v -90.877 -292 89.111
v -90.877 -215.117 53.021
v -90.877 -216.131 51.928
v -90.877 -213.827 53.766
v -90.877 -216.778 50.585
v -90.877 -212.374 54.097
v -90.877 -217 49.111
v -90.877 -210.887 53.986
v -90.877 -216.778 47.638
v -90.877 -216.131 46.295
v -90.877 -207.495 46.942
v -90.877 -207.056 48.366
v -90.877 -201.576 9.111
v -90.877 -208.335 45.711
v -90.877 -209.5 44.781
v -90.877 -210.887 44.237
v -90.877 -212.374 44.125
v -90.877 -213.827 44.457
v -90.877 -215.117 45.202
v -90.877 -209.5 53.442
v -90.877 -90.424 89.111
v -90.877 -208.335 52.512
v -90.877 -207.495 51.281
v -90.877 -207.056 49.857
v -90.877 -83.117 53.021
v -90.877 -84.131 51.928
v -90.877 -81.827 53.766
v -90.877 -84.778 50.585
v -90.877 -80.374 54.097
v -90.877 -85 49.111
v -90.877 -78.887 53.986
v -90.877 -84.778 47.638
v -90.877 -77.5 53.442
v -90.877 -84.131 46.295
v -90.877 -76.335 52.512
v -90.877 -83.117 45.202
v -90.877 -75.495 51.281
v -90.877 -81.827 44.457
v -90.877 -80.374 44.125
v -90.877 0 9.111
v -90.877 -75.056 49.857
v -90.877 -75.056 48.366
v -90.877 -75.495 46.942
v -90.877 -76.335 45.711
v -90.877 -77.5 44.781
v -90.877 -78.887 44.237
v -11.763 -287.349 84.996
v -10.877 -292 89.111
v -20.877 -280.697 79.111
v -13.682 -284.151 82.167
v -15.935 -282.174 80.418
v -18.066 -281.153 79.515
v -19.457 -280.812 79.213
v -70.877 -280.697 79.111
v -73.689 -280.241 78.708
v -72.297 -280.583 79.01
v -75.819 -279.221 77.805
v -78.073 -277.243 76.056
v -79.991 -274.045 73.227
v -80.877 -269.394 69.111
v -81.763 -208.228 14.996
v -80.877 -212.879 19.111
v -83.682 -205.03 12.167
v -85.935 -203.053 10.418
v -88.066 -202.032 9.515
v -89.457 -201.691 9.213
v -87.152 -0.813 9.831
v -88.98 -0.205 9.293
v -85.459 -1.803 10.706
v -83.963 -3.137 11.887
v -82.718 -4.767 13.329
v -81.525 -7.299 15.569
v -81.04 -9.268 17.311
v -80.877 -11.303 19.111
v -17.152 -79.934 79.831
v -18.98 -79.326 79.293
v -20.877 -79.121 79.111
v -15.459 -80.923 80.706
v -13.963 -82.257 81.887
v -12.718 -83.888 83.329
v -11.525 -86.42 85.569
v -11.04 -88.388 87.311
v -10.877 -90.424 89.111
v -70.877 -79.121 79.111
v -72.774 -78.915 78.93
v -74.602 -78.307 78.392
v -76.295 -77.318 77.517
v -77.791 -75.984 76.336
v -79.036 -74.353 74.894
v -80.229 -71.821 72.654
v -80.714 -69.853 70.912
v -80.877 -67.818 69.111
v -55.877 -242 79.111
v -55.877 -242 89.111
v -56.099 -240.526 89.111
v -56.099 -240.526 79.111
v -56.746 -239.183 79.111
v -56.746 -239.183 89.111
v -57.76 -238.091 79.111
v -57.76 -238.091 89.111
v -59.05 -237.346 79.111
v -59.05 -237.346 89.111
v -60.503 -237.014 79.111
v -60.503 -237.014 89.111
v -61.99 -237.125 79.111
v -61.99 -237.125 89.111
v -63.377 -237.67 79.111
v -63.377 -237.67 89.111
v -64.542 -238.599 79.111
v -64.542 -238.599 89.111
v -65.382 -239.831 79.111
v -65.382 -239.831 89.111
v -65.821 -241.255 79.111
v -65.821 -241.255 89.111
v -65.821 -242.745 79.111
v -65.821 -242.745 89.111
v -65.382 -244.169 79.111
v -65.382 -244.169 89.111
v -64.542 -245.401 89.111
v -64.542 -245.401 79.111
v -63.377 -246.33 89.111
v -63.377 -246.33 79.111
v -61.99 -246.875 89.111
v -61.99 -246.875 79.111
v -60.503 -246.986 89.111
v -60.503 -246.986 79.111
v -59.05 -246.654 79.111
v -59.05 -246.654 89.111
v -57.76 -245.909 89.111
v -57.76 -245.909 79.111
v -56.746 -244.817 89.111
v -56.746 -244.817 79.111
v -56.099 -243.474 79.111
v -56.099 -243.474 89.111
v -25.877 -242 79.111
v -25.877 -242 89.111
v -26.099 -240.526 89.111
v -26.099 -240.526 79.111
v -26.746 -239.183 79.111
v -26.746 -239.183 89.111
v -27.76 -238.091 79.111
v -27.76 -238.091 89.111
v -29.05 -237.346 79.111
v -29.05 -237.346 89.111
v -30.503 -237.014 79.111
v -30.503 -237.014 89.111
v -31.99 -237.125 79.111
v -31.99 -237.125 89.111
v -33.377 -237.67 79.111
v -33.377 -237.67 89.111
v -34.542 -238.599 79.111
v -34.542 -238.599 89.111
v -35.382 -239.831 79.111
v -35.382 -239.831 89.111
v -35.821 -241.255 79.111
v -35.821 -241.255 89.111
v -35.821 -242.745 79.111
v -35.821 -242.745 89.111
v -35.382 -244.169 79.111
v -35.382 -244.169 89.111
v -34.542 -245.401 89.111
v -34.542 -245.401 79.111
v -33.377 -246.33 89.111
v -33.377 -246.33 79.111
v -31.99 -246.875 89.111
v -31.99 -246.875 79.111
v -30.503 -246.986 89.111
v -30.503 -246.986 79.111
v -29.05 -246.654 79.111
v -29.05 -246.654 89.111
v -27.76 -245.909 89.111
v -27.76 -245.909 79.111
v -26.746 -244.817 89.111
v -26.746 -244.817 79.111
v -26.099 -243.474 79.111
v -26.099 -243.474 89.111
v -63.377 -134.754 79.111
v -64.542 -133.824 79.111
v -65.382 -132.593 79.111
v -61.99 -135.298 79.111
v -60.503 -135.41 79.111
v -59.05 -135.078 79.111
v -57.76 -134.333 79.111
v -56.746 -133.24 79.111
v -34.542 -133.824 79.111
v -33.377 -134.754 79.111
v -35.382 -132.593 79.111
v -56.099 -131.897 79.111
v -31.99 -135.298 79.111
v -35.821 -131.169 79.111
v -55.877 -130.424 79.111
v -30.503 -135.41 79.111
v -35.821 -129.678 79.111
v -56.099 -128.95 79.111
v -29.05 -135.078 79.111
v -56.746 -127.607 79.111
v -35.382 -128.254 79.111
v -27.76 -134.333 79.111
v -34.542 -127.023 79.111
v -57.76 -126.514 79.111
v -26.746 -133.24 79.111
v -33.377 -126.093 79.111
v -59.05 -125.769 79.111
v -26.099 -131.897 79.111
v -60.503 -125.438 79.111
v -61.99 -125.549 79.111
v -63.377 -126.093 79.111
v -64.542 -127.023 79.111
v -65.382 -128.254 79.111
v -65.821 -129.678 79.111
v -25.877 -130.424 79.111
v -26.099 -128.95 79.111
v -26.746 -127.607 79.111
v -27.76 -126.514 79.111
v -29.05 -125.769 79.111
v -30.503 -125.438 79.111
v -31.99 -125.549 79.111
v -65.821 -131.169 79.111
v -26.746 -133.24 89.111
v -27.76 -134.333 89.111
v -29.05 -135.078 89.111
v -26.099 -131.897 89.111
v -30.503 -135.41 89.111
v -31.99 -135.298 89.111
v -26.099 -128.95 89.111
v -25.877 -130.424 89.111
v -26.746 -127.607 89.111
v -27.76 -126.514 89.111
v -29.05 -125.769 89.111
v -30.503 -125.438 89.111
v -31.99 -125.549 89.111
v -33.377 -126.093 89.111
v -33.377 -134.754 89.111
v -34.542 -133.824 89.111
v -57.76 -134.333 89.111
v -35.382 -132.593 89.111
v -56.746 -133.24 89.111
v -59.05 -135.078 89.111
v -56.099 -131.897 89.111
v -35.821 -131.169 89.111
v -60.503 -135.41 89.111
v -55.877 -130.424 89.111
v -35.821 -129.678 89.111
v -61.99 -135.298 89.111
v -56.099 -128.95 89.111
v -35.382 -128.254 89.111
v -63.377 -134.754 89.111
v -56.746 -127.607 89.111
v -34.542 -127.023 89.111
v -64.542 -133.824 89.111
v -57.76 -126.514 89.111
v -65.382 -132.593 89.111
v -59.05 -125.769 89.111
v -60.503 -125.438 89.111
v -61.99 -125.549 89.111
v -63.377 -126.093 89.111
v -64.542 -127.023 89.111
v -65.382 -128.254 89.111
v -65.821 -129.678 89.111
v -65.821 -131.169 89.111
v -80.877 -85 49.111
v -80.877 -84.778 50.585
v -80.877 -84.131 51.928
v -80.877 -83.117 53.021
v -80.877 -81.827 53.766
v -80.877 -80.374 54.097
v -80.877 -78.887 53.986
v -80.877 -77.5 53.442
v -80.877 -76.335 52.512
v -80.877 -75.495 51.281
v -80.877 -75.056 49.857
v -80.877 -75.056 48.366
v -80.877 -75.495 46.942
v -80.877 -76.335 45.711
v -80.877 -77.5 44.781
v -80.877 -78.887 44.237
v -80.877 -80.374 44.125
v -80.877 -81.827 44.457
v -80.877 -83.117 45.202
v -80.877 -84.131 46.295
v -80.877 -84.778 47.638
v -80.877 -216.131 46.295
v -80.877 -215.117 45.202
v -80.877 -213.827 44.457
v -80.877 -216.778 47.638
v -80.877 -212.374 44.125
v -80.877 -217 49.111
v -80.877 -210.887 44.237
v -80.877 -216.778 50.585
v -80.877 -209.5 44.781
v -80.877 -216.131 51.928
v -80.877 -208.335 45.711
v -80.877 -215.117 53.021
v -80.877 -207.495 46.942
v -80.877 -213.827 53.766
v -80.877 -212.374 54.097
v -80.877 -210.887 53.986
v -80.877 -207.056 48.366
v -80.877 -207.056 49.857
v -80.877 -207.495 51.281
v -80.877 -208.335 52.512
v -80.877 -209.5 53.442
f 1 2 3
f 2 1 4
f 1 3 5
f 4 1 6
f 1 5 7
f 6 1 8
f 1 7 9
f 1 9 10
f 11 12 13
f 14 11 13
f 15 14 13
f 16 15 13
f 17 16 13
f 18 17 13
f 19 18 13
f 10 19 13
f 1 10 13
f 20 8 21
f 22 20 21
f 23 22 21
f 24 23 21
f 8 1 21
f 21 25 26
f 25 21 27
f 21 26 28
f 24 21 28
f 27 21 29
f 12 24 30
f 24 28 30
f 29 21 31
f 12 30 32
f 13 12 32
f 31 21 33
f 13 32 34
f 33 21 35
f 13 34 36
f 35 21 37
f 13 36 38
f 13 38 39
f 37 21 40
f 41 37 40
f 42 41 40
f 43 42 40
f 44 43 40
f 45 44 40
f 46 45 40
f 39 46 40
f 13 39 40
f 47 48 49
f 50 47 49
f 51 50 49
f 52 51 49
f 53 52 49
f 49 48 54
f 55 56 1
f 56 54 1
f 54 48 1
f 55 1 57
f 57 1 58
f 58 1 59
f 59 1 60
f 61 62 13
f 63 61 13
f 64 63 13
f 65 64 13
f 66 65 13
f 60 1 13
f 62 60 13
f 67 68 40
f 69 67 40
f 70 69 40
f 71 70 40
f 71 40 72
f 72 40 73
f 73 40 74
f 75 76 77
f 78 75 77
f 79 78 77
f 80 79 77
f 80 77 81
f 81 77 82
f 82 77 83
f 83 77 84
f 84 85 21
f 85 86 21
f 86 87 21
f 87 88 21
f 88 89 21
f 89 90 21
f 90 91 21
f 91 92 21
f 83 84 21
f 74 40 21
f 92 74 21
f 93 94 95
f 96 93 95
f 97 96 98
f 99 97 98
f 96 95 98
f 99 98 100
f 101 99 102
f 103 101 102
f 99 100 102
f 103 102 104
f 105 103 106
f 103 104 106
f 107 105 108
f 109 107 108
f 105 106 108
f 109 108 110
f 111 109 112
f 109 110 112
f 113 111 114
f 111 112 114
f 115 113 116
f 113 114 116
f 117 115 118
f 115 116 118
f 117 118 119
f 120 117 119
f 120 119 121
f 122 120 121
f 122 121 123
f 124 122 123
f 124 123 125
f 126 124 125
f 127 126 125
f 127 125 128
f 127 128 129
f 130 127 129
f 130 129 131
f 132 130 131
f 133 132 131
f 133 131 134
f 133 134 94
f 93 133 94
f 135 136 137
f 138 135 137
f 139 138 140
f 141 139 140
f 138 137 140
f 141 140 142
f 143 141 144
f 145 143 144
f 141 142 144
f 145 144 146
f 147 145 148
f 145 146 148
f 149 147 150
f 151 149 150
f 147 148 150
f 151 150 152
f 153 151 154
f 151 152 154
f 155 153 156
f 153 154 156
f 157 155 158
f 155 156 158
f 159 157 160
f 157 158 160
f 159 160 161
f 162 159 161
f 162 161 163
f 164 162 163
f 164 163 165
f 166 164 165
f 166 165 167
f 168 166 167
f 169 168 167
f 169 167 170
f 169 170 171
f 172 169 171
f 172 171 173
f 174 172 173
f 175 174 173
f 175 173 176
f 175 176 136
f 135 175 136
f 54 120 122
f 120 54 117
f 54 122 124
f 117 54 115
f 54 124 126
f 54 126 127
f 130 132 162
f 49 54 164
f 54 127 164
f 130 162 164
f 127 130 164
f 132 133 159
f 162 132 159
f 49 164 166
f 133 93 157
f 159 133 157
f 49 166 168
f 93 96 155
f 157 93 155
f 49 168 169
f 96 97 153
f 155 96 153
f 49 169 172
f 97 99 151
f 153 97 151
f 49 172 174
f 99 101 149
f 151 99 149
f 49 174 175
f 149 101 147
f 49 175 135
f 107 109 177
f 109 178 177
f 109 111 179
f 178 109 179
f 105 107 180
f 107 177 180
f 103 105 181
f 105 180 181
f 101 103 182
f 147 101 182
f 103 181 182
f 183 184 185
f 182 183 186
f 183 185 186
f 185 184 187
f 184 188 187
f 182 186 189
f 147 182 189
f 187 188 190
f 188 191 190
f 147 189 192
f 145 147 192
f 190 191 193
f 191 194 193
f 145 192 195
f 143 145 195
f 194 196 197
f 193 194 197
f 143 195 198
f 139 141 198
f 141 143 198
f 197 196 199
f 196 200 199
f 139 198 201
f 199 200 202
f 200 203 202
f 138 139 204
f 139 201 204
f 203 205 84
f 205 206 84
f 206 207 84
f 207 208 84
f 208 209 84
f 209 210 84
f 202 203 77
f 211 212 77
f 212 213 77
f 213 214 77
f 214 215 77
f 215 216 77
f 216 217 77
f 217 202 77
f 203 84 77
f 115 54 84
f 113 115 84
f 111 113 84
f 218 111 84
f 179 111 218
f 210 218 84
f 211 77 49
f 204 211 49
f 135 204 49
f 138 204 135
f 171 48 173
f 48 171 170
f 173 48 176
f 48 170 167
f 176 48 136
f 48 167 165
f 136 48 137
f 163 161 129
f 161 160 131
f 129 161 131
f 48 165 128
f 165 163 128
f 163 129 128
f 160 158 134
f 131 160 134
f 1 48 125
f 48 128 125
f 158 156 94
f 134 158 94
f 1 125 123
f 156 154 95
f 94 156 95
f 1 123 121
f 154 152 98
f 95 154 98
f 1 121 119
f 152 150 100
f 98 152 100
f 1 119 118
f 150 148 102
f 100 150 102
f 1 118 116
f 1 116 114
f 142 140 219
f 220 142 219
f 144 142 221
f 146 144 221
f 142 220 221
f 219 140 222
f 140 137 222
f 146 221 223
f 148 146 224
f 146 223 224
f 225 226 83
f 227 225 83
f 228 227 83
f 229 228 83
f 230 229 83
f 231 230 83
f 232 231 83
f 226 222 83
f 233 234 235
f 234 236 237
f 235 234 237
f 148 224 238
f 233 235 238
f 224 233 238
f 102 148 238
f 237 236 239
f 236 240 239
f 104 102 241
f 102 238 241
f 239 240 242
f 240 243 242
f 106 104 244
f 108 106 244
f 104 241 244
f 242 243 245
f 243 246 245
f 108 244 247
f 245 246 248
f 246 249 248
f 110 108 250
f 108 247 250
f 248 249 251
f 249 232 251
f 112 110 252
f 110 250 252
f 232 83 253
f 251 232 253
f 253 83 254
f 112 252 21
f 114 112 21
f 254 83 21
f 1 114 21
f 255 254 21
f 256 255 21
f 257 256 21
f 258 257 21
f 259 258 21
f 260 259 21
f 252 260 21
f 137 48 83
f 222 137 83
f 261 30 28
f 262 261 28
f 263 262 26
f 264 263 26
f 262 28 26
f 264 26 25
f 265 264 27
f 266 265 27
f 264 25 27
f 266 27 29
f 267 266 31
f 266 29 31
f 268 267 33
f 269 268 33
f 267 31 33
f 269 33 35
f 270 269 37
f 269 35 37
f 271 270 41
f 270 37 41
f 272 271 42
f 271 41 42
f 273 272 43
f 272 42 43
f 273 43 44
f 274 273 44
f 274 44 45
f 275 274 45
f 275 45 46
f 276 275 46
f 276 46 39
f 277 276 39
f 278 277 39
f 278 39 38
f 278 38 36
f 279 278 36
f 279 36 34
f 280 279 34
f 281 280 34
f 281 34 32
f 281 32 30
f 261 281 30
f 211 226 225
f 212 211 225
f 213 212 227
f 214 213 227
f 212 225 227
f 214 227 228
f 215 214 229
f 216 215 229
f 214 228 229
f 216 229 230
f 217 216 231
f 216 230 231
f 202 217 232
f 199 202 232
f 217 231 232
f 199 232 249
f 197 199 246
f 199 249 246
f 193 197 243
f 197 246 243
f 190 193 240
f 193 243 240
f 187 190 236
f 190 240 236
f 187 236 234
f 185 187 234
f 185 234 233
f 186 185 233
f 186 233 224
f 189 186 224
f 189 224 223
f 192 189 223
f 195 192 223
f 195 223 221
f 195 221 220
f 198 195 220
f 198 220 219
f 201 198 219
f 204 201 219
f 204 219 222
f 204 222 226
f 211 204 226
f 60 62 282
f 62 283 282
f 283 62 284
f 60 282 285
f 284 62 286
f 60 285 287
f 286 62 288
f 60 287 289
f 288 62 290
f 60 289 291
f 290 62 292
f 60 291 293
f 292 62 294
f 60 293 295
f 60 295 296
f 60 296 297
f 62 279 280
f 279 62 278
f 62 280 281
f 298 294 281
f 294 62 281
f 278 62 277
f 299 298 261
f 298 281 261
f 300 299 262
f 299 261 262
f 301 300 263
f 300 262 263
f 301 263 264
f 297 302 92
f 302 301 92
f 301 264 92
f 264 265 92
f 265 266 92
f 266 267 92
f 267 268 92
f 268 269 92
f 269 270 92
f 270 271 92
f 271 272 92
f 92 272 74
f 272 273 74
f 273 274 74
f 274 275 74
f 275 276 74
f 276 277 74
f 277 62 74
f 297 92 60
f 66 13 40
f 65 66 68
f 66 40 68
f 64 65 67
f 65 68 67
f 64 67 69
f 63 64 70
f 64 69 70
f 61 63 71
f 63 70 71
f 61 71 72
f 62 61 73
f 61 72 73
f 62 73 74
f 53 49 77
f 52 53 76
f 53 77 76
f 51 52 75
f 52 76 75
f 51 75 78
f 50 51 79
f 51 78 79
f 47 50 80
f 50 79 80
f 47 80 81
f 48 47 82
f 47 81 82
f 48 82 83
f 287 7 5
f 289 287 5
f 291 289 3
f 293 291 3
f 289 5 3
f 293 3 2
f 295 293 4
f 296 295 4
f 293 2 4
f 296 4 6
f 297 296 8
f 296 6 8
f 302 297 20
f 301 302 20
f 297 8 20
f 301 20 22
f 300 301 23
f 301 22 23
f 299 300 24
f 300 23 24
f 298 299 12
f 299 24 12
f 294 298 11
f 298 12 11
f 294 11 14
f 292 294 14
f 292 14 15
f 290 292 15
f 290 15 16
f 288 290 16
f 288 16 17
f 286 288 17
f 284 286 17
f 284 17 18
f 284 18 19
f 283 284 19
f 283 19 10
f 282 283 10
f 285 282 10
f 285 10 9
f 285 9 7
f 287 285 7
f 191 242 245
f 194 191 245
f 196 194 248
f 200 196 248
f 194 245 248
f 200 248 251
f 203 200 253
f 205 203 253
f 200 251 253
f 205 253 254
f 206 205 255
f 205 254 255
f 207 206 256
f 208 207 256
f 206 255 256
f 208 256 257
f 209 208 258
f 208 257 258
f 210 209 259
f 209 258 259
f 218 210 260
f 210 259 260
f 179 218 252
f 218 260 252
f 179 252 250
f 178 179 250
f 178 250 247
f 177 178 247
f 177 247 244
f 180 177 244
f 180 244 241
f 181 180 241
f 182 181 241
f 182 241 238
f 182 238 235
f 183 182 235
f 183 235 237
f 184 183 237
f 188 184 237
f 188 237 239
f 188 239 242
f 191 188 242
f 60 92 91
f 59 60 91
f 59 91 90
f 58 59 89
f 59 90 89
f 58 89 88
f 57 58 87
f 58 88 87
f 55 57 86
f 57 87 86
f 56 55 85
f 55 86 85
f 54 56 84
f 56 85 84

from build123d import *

# Parameters (mm, degrees)
F1_DEPTH = 292
F3_DEPTH = 80
F4_R     = 5
F5_DEPTH = 25
F6_R     = 5
F7_DEPTH = 25


with BuildPart() as f1:
    # F0 (on Front) → F1 (new body)
    with BuildSketch(Plane.XZ):
        with BuildLine():
            Line((-10.877076, 89.111448), (-90.877076, 89.111448))
            Line((-90.877076, 89.111448), (-90.877076, 9.111448))
            ThreePointArc((-90.877076, 9.111448), (-83.806008, 12.04038), (-80.877076, 19.111448))
            Line((-80.877076, 19.111448), (-80.877076, 69.111448))
            ThreePointArc((-80.877076, 69.111448), (-77.948143, 76.182516), (-70.877076, 79.111448))
            Line((-70.877076, 79.111448), (-20.877076, 79.111448))
            ThreePointArc((-20.877076, 79.111448), (-13.806008, 82.04038), (-10.877076, 89.111448))
        make_face()
    extrude(amount=F1_DEPTH)

    # F2 (on face) → F3 (cut)
    with BuildSketch(Plane(origin=(-90.877076, 0, 0), x_dir=(0, -1, 0), z_dir=(-1, 0, 0))):
        Polygon((292, 9.111448), (292, 89.111448), (201.576449, 9.111448), align=None)
        Polygon((0, 9.111448), (90.423551, 89.111448), (0, 89.111448), align=None)
    extrude(amount=-F3_DEPTH, mode=Mode.SUBTRACT)

    # F4 (on face) → F5 (cut)
    with BuildSketch(Plane(origin=(-90.877076, 0, 0), x_dir=(0, -1, 0), z_dir=(-1, 0, 0))):
        with Locations((212, 49.111448)):
            Circle(F4_R)
        with Locations((80, 49.111448)):
            Circle(F4_R)
    extrude(amount=-F5_DEPTH, mode=Mode.SUBTRACT)

    # F6 (on face) → F7 (cut)
    with BuildSketch(Plane.XY.offset(89.111448)):
        with Locations((-60.877076, -242)):
            Circle(F6_R)
        with Locations((-60.877076, -130.423551)):
            Circle(F6_R)
        with Locations((-30.877076, -130.423551)):
            Circle(F6_R)
        with Locations((-30.877076, -242)):
            Circle(F6_R)
    extrude(amount=-F7_DEPTH, mode=Mode.SUBTRACT)


solid = f1.part
